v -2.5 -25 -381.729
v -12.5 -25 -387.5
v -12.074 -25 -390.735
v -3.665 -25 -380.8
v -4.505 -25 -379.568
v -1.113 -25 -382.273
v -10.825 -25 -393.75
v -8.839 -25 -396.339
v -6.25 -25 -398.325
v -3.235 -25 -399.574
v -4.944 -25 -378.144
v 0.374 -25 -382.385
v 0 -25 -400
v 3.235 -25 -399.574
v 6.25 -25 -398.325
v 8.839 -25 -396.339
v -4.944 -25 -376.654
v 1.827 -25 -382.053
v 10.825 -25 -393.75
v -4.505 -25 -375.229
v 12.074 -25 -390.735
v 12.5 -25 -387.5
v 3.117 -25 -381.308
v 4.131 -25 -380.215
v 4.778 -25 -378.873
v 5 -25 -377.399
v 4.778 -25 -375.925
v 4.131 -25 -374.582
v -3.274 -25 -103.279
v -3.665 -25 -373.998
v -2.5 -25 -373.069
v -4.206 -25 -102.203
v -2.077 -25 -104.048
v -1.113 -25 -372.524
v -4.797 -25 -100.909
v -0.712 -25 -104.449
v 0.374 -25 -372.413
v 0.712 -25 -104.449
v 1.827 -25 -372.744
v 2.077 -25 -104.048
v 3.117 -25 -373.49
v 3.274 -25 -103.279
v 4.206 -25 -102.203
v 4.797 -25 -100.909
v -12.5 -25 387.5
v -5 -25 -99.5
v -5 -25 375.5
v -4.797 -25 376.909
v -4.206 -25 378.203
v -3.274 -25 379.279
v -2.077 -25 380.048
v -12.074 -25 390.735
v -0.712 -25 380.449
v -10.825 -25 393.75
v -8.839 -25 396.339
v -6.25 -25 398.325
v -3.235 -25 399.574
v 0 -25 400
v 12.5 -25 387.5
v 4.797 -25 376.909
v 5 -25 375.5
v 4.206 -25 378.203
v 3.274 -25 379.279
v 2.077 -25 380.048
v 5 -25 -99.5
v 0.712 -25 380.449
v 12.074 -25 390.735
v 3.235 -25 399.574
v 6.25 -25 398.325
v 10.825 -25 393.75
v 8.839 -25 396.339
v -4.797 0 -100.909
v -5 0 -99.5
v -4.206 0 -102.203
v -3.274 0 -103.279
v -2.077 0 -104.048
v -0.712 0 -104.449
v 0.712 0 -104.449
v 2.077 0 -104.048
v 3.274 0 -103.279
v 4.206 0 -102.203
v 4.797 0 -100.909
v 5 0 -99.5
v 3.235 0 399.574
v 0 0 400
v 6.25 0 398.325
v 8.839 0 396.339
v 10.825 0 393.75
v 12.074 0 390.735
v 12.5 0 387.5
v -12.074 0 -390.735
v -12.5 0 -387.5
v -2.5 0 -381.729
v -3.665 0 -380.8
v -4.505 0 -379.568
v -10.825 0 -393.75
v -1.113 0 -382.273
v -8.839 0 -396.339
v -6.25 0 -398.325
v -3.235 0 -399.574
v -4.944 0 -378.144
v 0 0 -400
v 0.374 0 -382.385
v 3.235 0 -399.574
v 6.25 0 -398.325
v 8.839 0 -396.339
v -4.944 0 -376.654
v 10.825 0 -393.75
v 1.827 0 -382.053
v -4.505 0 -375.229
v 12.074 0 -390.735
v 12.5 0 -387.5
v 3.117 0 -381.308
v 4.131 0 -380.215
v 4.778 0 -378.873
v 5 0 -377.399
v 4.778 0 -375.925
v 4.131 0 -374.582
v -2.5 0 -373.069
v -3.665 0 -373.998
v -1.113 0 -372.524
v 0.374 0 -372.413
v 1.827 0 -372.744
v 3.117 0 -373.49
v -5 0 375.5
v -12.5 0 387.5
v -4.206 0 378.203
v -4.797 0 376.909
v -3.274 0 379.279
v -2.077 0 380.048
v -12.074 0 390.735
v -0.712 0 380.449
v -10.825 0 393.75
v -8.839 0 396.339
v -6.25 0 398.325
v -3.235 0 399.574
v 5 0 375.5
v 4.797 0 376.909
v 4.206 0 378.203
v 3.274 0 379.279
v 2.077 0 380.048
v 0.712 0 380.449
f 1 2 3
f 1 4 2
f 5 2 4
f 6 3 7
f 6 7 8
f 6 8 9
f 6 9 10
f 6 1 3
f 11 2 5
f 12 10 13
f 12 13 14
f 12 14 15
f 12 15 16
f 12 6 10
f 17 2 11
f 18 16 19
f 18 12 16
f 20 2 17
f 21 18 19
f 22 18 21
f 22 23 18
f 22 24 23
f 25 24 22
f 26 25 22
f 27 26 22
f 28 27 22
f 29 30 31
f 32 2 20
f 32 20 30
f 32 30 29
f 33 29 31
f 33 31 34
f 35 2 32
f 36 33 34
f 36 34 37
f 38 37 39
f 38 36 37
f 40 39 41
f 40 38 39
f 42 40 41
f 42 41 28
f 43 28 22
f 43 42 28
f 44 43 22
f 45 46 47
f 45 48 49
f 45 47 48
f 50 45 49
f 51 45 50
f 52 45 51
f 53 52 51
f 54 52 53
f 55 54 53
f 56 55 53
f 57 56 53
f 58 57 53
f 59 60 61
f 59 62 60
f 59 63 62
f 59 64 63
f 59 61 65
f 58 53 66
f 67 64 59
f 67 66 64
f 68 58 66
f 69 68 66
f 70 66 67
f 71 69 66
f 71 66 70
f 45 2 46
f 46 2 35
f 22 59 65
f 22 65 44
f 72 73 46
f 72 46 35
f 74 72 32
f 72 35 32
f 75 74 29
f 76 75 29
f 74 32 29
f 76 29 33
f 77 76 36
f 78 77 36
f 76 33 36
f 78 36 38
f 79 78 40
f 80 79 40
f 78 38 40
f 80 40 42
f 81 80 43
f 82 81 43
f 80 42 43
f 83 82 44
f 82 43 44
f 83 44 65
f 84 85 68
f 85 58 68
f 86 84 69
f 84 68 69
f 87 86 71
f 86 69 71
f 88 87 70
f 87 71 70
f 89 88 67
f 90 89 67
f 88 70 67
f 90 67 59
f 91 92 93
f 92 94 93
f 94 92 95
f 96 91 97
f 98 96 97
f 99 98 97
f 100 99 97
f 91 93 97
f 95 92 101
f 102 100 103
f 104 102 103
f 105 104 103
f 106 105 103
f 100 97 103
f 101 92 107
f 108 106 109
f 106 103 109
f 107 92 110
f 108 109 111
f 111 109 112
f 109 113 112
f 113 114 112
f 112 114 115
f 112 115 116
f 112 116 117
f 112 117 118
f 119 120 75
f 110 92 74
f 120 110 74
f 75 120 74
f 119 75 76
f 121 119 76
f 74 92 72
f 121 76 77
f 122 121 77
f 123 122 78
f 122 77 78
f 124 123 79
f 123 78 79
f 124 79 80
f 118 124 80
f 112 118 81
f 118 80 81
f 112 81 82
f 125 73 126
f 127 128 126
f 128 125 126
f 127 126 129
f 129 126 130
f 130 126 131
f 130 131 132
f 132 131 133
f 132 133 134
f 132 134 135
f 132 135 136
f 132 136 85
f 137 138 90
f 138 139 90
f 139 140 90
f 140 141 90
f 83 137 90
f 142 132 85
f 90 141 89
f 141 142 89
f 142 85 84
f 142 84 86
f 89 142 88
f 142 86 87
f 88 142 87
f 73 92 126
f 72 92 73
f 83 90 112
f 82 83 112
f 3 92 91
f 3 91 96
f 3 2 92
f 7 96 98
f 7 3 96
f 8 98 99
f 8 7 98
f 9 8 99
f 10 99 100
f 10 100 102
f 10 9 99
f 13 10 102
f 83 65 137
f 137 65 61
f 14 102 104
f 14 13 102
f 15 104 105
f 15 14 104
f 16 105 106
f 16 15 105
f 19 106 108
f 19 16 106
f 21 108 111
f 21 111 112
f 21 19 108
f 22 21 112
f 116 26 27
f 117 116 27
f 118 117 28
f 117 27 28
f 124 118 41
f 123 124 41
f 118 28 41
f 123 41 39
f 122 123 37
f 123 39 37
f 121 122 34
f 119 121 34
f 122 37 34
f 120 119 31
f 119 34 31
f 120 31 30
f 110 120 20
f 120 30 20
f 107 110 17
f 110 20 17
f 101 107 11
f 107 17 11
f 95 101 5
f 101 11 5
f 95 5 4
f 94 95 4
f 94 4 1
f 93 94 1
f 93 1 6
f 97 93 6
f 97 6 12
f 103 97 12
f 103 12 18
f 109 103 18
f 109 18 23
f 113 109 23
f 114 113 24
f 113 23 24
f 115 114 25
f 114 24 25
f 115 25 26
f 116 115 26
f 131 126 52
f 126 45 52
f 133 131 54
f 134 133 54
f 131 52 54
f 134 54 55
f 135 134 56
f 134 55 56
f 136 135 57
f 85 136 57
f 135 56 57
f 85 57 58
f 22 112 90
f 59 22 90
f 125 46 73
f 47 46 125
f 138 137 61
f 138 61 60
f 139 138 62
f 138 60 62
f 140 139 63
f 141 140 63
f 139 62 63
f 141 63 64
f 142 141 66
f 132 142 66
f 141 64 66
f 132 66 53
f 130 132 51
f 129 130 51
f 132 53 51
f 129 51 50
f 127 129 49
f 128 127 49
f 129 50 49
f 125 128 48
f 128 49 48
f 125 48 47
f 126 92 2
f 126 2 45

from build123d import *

# Parameters (mm, degrees)
F0_W     = 25
F0_H     = 800
F1_DEPTH = 25
F2_W     = 10
F2_H     = 475
F3_DEPTH = 25
F4_R     = 5
F5_DEPTH = 25
F7_DEPTH = 25
F9_DEPTH = 25
F10_R    = 12.49999
F11_R    = 12.49999


# Not quite as in the source:
# - a fillet or chamfer is up to 0.001 mm smaller than in the source, because OpenCascade refuses the exact size


with BuildPart() as f1:
    # F0 (on Front) → F1 (new body)
    with BuildSketch(Plane.XZ):
        Rectangle(F0_W, F0_H)
    extrude(amount=F1_DEPTH)

    # F2 (on face) → F3 (cut)
    with BuildSketch(Plane.XZ.offset(25)):
        with Locations((0, 138.0000114441)):
            Rectangle(F2_W, F2_H)
    extrude(amount=-F3_DEPTH, mode=Mode.SUBTRACT)

    # F4 (on face) → F5 (cut)
    with BuildSketch(Plane.XZ.offset(25)):
        with Locations((0, -377.3987293243)):
            Circle(F4_R)
    extrude(amount=-F5_DEPTH, mode=Mode.SUBTRACT)

    # F6 (on face) → F7 (cut)
    with BuildSketch(Plane.XZ.offset(25)):
        with BuildLine():
            Line((-5, 375.5000114441), (5, 375.5000114441))
            ThreePointArc((5, 375.5000114441), (0, 380.5000114441), (-5, 375.5000114441))
        make_face()
    extrude(amount=-F7_DEPTH, mode=Mode.SUBTRACT)

    # F8 (on face) → F9 (cut)
    with BuildSketch(Plane.XZ.offset(25)):
        with BuildLine():
            Line((5, -99.4999885559), (-5, -99.4999885559))
            ThreePointArc((-5, -99.4999885559), (0, -104.4999885559), (5, -99.4999885559))
        make_face()
    extrude(amount=-F9_DEPTH, mode=Mode.SUBTRACT)

    # F10 (radius 12.5 in the source; OpenCascade refuses exactly that, so slightly less here)
    f10_edges = [f1.edges().sort_by_distance(p)[0] for p in [
        (-12.5, -12.5, 400),
        (12.5, -12.5, 400),
    ]]
    fillet(f10_edges, radius=F10_R)

    # F11 (radius 12.5 in the source; OpenCascade refuses exactly that, so slightly less here)
    f11_edges = [f1.edges().sort_by_distance(p)[0] for p in [
        (-12.5, -12.5, -400),
        (12.5, -12.5, -400),
    ]]
    fillet(f11_edges, radius=F11_R)


solid = f1.part
